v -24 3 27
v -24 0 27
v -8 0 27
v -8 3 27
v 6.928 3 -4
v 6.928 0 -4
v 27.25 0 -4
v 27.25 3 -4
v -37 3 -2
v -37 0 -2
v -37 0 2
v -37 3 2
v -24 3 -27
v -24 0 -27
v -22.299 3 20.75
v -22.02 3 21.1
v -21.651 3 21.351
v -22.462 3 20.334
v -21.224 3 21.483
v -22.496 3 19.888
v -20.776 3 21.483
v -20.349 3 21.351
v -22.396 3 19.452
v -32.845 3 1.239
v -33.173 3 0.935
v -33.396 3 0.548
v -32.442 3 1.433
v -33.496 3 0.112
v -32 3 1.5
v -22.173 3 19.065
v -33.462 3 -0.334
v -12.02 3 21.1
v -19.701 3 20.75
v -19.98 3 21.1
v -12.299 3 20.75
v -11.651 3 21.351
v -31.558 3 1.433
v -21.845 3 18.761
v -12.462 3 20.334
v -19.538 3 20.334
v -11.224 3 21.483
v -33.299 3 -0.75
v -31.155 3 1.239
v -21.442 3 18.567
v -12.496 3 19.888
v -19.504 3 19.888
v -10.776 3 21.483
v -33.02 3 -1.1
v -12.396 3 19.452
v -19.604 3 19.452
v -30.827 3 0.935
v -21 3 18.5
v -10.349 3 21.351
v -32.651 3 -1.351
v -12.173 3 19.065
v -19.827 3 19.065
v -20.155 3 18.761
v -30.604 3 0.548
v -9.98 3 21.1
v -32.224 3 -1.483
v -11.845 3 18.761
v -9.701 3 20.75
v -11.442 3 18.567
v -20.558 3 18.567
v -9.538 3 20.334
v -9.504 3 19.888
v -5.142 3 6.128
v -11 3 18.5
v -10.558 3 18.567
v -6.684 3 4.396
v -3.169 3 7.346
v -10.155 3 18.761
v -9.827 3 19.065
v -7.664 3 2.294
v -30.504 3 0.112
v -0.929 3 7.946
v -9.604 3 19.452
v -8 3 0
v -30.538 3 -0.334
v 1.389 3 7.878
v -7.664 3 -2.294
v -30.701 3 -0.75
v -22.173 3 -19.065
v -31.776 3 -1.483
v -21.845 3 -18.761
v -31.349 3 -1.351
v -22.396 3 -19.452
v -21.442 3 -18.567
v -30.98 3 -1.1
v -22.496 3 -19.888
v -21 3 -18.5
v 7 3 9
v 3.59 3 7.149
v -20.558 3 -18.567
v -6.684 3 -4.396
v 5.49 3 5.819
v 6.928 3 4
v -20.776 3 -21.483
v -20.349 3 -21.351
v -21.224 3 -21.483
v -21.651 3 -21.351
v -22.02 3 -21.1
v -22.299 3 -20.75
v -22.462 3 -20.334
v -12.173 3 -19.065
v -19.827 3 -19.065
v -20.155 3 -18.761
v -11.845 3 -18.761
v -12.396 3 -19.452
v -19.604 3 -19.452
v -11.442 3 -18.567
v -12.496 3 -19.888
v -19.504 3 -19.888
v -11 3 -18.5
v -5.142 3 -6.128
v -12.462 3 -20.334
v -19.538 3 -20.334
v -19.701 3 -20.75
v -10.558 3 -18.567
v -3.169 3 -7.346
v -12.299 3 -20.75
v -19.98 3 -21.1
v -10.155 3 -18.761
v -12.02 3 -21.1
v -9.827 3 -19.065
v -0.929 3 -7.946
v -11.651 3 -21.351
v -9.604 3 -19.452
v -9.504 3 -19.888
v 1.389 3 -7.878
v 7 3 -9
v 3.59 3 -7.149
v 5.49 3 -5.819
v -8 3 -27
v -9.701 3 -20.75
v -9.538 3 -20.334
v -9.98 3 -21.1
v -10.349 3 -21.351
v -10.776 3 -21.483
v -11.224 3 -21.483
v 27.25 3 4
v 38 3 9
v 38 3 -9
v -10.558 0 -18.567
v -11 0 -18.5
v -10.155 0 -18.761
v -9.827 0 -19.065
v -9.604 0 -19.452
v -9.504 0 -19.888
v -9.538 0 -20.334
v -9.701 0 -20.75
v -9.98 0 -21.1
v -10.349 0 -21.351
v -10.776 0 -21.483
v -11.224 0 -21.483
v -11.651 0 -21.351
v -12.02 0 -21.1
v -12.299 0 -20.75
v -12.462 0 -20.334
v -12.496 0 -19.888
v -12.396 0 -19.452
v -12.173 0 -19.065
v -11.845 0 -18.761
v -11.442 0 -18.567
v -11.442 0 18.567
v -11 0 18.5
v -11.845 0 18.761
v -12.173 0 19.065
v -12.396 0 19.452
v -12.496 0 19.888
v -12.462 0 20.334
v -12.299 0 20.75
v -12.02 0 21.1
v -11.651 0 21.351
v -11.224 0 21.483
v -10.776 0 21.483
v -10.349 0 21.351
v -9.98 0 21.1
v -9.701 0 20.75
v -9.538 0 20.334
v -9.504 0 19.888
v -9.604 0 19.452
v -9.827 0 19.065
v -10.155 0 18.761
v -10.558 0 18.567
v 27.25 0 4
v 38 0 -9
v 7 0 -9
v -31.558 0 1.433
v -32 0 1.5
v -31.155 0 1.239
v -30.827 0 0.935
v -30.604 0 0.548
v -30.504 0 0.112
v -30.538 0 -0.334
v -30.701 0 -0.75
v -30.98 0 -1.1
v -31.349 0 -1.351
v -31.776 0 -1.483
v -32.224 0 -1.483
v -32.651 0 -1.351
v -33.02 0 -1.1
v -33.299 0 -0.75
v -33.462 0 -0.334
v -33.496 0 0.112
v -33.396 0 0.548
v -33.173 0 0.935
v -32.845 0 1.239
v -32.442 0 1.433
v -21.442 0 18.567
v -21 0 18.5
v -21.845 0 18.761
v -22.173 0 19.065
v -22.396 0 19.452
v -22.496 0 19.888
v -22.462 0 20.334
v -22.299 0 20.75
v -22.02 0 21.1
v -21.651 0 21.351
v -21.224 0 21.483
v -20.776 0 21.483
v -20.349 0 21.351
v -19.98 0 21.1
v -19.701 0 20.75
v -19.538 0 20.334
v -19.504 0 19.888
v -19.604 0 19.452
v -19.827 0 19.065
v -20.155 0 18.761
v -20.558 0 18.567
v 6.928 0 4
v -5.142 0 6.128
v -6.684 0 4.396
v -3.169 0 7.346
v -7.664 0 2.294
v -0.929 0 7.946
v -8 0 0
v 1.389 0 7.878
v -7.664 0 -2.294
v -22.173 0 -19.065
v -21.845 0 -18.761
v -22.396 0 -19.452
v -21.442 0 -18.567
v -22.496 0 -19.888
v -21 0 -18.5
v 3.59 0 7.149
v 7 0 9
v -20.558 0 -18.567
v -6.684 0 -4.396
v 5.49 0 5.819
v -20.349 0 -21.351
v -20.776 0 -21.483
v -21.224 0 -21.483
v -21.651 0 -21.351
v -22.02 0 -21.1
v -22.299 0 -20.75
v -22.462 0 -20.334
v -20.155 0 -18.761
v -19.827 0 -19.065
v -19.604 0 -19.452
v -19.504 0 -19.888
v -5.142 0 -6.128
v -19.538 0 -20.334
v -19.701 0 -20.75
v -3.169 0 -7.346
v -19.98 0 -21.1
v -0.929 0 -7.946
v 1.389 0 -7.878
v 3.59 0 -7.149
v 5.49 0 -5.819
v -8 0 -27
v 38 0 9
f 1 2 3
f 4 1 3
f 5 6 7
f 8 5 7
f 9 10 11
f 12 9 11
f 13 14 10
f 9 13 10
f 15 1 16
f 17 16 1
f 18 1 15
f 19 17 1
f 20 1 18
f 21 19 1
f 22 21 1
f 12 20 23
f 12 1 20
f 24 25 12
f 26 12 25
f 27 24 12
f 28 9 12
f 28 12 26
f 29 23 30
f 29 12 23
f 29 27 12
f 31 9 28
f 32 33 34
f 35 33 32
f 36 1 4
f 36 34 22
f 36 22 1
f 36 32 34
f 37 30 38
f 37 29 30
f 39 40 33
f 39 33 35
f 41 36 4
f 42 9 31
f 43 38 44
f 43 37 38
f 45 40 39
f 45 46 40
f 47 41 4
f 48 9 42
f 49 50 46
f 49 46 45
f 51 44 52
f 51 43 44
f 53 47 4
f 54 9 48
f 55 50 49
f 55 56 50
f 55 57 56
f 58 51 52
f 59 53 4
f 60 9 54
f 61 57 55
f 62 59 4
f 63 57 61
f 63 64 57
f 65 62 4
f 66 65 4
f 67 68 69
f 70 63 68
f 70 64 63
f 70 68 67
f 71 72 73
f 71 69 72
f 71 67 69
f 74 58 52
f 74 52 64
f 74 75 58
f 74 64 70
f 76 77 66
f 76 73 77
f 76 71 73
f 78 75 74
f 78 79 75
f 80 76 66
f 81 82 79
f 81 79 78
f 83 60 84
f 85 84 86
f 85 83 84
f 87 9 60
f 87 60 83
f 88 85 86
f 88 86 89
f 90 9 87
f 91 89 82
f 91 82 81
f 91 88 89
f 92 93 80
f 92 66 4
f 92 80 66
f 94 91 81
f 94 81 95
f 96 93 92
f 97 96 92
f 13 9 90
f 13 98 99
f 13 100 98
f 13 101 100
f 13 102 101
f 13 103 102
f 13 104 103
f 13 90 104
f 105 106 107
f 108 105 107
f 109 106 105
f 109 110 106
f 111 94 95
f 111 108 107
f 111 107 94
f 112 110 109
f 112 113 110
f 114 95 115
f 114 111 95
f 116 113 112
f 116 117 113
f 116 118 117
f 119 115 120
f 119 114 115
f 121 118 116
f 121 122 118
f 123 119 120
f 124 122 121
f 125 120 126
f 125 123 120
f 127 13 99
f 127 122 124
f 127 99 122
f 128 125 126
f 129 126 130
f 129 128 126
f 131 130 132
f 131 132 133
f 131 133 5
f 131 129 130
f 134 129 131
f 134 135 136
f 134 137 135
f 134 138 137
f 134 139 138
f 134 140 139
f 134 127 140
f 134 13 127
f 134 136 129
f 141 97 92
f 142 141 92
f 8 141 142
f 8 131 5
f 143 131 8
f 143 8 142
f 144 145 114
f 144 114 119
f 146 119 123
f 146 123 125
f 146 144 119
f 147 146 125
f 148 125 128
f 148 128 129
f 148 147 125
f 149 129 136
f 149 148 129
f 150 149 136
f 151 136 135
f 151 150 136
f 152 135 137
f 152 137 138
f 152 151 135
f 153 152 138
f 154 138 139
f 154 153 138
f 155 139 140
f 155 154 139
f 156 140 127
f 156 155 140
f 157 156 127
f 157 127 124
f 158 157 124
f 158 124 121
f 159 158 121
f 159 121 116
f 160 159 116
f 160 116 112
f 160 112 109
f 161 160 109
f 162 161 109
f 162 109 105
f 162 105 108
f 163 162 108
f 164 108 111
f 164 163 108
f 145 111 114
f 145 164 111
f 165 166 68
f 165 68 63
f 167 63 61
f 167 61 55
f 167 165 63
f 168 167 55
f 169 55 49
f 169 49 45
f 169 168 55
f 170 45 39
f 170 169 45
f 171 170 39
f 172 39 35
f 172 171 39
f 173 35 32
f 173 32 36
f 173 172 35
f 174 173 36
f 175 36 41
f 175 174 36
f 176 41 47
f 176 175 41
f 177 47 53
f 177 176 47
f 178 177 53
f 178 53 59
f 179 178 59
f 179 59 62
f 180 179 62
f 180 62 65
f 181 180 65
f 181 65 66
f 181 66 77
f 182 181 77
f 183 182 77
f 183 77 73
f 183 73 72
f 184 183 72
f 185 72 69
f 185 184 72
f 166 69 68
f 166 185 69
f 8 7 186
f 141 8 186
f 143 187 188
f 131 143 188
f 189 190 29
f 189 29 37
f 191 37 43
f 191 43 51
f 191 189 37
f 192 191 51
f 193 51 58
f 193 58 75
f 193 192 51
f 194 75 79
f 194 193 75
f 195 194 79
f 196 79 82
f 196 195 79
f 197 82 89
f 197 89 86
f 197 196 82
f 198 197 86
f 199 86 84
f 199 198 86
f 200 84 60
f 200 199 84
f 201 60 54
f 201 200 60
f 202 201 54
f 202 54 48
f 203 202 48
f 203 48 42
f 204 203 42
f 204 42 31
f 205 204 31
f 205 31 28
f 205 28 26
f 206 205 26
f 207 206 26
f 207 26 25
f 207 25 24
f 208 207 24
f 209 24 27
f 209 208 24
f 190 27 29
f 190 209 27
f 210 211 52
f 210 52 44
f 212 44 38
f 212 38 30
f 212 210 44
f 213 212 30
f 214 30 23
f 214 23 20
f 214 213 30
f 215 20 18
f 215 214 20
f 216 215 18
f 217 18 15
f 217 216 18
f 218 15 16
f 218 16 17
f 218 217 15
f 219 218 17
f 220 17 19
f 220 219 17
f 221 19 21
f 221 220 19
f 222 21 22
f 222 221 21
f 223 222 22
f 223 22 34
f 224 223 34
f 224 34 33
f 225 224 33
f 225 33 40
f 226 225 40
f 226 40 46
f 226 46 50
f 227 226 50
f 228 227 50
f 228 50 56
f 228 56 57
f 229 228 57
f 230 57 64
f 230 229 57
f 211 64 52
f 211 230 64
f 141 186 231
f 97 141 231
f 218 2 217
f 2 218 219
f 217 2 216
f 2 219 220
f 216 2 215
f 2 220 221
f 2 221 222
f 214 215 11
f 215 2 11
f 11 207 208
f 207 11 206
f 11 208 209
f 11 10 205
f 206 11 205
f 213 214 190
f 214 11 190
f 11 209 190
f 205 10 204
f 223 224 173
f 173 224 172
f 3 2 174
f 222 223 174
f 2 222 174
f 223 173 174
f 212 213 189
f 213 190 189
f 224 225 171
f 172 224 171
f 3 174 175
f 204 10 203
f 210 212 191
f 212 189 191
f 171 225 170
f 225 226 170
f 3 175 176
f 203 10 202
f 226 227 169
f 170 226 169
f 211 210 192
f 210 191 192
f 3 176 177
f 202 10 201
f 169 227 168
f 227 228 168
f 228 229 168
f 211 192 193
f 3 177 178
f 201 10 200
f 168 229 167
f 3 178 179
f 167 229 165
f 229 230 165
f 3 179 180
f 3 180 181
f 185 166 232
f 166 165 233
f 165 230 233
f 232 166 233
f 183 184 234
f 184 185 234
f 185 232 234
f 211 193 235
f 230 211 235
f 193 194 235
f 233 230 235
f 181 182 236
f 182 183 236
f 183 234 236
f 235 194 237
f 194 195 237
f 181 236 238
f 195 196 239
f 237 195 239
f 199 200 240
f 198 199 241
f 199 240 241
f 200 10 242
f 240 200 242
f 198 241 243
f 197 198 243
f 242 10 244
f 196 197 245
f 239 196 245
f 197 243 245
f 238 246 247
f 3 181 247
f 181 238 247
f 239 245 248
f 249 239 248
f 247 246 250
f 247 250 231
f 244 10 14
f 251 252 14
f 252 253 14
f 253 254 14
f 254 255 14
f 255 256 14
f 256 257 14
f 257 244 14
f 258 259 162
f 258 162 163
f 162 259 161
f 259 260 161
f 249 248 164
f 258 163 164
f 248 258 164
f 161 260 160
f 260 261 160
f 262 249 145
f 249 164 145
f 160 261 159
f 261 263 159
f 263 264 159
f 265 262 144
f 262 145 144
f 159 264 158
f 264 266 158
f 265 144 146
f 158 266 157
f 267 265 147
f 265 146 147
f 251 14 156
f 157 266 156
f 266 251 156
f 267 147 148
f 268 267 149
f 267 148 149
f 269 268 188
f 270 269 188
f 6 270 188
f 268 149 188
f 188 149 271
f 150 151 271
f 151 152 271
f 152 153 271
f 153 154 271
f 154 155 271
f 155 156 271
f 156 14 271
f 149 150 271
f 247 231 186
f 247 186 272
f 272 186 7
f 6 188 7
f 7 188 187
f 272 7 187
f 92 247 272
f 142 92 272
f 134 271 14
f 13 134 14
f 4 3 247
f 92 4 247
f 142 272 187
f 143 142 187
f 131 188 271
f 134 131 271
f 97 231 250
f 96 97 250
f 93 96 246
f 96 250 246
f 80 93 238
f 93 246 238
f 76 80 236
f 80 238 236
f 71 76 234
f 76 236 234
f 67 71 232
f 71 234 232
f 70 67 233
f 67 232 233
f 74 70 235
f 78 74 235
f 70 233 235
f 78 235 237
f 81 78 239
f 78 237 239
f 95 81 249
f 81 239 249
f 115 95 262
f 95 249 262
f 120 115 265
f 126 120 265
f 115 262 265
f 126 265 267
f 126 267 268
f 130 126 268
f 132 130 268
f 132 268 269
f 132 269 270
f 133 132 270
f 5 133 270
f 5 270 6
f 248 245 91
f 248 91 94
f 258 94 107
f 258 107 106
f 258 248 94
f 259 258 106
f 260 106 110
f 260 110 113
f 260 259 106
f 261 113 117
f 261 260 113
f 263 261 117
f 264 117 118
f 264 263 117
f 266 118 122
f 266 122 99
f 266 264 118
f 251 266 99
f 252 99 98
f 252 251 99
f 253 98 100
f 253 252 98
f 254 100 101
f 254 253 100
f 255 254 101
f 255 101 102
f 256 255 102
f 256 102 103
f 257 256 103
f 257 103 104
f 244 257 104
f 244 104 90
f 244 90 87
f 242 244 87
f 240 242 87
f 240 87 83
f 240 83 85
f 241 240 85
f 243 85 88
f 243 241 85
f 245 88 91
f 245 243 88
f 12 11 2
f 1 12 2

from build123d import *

# Parameters (mm, degrees)
SKETCH_1_R      = 1.5
EXTRUDE_1_DEPTH = 3


with BuildPart() as part:
    # 草图1 → 凸台-拉伸1 (new body)
    with BuildSketch(Plane(origin=(0, 0, 0), x_dir=(1, 0, 0), z_dir=(0, 1, 0))):
        Polygon((38, -9), (38, 9), (7, 9), (-8, 27), (-24, 27), (-37, 2), (-37, -2), (-24, -27), (-8, -27), (7, -9), align=None)
        with Locations(Location((-21, 20, 0), (0, 0, 270))):
            Circle(SKETCH_1_R, mode=Mode.SUBTRACT)
        with Locations(Location((-11, 20, 0), (0, 0, 270))):
            Circle(SKETCH_1_R, mode=Mode.SUBTRACT)
        with Locations(Location((-11, -20, 0), (0, 0, 90))):
            Circle(SKETCH_1_R, mode=Mode.SUBTRACT)
        with Locations(Location((-21, -20, 0), (0, 0, 90))):
            Circle(SKETCH_1_R, mode=Mode.SUBTRACT)
        with Locations(Location((-32, 0, 0), (0, 0, 270))):
            Circle(SKETCH_1_R, mode=Mode.SUBTRACT)
        with BuildLine():
            Line((6.92820323, 4), (27.25, 4))
            Line((27.25, 4), (27.25, -4))
            Line((27.25, -4), (6.92820323, -4))
            ThreePointArc((6.92820323, -4), (-8, 0), (6.92820323, 4))
        make_face(mode=Mode.SUBTRACT)
    extrude(amount=EXTRUDE_1_DEPTH)


solid = part.part
